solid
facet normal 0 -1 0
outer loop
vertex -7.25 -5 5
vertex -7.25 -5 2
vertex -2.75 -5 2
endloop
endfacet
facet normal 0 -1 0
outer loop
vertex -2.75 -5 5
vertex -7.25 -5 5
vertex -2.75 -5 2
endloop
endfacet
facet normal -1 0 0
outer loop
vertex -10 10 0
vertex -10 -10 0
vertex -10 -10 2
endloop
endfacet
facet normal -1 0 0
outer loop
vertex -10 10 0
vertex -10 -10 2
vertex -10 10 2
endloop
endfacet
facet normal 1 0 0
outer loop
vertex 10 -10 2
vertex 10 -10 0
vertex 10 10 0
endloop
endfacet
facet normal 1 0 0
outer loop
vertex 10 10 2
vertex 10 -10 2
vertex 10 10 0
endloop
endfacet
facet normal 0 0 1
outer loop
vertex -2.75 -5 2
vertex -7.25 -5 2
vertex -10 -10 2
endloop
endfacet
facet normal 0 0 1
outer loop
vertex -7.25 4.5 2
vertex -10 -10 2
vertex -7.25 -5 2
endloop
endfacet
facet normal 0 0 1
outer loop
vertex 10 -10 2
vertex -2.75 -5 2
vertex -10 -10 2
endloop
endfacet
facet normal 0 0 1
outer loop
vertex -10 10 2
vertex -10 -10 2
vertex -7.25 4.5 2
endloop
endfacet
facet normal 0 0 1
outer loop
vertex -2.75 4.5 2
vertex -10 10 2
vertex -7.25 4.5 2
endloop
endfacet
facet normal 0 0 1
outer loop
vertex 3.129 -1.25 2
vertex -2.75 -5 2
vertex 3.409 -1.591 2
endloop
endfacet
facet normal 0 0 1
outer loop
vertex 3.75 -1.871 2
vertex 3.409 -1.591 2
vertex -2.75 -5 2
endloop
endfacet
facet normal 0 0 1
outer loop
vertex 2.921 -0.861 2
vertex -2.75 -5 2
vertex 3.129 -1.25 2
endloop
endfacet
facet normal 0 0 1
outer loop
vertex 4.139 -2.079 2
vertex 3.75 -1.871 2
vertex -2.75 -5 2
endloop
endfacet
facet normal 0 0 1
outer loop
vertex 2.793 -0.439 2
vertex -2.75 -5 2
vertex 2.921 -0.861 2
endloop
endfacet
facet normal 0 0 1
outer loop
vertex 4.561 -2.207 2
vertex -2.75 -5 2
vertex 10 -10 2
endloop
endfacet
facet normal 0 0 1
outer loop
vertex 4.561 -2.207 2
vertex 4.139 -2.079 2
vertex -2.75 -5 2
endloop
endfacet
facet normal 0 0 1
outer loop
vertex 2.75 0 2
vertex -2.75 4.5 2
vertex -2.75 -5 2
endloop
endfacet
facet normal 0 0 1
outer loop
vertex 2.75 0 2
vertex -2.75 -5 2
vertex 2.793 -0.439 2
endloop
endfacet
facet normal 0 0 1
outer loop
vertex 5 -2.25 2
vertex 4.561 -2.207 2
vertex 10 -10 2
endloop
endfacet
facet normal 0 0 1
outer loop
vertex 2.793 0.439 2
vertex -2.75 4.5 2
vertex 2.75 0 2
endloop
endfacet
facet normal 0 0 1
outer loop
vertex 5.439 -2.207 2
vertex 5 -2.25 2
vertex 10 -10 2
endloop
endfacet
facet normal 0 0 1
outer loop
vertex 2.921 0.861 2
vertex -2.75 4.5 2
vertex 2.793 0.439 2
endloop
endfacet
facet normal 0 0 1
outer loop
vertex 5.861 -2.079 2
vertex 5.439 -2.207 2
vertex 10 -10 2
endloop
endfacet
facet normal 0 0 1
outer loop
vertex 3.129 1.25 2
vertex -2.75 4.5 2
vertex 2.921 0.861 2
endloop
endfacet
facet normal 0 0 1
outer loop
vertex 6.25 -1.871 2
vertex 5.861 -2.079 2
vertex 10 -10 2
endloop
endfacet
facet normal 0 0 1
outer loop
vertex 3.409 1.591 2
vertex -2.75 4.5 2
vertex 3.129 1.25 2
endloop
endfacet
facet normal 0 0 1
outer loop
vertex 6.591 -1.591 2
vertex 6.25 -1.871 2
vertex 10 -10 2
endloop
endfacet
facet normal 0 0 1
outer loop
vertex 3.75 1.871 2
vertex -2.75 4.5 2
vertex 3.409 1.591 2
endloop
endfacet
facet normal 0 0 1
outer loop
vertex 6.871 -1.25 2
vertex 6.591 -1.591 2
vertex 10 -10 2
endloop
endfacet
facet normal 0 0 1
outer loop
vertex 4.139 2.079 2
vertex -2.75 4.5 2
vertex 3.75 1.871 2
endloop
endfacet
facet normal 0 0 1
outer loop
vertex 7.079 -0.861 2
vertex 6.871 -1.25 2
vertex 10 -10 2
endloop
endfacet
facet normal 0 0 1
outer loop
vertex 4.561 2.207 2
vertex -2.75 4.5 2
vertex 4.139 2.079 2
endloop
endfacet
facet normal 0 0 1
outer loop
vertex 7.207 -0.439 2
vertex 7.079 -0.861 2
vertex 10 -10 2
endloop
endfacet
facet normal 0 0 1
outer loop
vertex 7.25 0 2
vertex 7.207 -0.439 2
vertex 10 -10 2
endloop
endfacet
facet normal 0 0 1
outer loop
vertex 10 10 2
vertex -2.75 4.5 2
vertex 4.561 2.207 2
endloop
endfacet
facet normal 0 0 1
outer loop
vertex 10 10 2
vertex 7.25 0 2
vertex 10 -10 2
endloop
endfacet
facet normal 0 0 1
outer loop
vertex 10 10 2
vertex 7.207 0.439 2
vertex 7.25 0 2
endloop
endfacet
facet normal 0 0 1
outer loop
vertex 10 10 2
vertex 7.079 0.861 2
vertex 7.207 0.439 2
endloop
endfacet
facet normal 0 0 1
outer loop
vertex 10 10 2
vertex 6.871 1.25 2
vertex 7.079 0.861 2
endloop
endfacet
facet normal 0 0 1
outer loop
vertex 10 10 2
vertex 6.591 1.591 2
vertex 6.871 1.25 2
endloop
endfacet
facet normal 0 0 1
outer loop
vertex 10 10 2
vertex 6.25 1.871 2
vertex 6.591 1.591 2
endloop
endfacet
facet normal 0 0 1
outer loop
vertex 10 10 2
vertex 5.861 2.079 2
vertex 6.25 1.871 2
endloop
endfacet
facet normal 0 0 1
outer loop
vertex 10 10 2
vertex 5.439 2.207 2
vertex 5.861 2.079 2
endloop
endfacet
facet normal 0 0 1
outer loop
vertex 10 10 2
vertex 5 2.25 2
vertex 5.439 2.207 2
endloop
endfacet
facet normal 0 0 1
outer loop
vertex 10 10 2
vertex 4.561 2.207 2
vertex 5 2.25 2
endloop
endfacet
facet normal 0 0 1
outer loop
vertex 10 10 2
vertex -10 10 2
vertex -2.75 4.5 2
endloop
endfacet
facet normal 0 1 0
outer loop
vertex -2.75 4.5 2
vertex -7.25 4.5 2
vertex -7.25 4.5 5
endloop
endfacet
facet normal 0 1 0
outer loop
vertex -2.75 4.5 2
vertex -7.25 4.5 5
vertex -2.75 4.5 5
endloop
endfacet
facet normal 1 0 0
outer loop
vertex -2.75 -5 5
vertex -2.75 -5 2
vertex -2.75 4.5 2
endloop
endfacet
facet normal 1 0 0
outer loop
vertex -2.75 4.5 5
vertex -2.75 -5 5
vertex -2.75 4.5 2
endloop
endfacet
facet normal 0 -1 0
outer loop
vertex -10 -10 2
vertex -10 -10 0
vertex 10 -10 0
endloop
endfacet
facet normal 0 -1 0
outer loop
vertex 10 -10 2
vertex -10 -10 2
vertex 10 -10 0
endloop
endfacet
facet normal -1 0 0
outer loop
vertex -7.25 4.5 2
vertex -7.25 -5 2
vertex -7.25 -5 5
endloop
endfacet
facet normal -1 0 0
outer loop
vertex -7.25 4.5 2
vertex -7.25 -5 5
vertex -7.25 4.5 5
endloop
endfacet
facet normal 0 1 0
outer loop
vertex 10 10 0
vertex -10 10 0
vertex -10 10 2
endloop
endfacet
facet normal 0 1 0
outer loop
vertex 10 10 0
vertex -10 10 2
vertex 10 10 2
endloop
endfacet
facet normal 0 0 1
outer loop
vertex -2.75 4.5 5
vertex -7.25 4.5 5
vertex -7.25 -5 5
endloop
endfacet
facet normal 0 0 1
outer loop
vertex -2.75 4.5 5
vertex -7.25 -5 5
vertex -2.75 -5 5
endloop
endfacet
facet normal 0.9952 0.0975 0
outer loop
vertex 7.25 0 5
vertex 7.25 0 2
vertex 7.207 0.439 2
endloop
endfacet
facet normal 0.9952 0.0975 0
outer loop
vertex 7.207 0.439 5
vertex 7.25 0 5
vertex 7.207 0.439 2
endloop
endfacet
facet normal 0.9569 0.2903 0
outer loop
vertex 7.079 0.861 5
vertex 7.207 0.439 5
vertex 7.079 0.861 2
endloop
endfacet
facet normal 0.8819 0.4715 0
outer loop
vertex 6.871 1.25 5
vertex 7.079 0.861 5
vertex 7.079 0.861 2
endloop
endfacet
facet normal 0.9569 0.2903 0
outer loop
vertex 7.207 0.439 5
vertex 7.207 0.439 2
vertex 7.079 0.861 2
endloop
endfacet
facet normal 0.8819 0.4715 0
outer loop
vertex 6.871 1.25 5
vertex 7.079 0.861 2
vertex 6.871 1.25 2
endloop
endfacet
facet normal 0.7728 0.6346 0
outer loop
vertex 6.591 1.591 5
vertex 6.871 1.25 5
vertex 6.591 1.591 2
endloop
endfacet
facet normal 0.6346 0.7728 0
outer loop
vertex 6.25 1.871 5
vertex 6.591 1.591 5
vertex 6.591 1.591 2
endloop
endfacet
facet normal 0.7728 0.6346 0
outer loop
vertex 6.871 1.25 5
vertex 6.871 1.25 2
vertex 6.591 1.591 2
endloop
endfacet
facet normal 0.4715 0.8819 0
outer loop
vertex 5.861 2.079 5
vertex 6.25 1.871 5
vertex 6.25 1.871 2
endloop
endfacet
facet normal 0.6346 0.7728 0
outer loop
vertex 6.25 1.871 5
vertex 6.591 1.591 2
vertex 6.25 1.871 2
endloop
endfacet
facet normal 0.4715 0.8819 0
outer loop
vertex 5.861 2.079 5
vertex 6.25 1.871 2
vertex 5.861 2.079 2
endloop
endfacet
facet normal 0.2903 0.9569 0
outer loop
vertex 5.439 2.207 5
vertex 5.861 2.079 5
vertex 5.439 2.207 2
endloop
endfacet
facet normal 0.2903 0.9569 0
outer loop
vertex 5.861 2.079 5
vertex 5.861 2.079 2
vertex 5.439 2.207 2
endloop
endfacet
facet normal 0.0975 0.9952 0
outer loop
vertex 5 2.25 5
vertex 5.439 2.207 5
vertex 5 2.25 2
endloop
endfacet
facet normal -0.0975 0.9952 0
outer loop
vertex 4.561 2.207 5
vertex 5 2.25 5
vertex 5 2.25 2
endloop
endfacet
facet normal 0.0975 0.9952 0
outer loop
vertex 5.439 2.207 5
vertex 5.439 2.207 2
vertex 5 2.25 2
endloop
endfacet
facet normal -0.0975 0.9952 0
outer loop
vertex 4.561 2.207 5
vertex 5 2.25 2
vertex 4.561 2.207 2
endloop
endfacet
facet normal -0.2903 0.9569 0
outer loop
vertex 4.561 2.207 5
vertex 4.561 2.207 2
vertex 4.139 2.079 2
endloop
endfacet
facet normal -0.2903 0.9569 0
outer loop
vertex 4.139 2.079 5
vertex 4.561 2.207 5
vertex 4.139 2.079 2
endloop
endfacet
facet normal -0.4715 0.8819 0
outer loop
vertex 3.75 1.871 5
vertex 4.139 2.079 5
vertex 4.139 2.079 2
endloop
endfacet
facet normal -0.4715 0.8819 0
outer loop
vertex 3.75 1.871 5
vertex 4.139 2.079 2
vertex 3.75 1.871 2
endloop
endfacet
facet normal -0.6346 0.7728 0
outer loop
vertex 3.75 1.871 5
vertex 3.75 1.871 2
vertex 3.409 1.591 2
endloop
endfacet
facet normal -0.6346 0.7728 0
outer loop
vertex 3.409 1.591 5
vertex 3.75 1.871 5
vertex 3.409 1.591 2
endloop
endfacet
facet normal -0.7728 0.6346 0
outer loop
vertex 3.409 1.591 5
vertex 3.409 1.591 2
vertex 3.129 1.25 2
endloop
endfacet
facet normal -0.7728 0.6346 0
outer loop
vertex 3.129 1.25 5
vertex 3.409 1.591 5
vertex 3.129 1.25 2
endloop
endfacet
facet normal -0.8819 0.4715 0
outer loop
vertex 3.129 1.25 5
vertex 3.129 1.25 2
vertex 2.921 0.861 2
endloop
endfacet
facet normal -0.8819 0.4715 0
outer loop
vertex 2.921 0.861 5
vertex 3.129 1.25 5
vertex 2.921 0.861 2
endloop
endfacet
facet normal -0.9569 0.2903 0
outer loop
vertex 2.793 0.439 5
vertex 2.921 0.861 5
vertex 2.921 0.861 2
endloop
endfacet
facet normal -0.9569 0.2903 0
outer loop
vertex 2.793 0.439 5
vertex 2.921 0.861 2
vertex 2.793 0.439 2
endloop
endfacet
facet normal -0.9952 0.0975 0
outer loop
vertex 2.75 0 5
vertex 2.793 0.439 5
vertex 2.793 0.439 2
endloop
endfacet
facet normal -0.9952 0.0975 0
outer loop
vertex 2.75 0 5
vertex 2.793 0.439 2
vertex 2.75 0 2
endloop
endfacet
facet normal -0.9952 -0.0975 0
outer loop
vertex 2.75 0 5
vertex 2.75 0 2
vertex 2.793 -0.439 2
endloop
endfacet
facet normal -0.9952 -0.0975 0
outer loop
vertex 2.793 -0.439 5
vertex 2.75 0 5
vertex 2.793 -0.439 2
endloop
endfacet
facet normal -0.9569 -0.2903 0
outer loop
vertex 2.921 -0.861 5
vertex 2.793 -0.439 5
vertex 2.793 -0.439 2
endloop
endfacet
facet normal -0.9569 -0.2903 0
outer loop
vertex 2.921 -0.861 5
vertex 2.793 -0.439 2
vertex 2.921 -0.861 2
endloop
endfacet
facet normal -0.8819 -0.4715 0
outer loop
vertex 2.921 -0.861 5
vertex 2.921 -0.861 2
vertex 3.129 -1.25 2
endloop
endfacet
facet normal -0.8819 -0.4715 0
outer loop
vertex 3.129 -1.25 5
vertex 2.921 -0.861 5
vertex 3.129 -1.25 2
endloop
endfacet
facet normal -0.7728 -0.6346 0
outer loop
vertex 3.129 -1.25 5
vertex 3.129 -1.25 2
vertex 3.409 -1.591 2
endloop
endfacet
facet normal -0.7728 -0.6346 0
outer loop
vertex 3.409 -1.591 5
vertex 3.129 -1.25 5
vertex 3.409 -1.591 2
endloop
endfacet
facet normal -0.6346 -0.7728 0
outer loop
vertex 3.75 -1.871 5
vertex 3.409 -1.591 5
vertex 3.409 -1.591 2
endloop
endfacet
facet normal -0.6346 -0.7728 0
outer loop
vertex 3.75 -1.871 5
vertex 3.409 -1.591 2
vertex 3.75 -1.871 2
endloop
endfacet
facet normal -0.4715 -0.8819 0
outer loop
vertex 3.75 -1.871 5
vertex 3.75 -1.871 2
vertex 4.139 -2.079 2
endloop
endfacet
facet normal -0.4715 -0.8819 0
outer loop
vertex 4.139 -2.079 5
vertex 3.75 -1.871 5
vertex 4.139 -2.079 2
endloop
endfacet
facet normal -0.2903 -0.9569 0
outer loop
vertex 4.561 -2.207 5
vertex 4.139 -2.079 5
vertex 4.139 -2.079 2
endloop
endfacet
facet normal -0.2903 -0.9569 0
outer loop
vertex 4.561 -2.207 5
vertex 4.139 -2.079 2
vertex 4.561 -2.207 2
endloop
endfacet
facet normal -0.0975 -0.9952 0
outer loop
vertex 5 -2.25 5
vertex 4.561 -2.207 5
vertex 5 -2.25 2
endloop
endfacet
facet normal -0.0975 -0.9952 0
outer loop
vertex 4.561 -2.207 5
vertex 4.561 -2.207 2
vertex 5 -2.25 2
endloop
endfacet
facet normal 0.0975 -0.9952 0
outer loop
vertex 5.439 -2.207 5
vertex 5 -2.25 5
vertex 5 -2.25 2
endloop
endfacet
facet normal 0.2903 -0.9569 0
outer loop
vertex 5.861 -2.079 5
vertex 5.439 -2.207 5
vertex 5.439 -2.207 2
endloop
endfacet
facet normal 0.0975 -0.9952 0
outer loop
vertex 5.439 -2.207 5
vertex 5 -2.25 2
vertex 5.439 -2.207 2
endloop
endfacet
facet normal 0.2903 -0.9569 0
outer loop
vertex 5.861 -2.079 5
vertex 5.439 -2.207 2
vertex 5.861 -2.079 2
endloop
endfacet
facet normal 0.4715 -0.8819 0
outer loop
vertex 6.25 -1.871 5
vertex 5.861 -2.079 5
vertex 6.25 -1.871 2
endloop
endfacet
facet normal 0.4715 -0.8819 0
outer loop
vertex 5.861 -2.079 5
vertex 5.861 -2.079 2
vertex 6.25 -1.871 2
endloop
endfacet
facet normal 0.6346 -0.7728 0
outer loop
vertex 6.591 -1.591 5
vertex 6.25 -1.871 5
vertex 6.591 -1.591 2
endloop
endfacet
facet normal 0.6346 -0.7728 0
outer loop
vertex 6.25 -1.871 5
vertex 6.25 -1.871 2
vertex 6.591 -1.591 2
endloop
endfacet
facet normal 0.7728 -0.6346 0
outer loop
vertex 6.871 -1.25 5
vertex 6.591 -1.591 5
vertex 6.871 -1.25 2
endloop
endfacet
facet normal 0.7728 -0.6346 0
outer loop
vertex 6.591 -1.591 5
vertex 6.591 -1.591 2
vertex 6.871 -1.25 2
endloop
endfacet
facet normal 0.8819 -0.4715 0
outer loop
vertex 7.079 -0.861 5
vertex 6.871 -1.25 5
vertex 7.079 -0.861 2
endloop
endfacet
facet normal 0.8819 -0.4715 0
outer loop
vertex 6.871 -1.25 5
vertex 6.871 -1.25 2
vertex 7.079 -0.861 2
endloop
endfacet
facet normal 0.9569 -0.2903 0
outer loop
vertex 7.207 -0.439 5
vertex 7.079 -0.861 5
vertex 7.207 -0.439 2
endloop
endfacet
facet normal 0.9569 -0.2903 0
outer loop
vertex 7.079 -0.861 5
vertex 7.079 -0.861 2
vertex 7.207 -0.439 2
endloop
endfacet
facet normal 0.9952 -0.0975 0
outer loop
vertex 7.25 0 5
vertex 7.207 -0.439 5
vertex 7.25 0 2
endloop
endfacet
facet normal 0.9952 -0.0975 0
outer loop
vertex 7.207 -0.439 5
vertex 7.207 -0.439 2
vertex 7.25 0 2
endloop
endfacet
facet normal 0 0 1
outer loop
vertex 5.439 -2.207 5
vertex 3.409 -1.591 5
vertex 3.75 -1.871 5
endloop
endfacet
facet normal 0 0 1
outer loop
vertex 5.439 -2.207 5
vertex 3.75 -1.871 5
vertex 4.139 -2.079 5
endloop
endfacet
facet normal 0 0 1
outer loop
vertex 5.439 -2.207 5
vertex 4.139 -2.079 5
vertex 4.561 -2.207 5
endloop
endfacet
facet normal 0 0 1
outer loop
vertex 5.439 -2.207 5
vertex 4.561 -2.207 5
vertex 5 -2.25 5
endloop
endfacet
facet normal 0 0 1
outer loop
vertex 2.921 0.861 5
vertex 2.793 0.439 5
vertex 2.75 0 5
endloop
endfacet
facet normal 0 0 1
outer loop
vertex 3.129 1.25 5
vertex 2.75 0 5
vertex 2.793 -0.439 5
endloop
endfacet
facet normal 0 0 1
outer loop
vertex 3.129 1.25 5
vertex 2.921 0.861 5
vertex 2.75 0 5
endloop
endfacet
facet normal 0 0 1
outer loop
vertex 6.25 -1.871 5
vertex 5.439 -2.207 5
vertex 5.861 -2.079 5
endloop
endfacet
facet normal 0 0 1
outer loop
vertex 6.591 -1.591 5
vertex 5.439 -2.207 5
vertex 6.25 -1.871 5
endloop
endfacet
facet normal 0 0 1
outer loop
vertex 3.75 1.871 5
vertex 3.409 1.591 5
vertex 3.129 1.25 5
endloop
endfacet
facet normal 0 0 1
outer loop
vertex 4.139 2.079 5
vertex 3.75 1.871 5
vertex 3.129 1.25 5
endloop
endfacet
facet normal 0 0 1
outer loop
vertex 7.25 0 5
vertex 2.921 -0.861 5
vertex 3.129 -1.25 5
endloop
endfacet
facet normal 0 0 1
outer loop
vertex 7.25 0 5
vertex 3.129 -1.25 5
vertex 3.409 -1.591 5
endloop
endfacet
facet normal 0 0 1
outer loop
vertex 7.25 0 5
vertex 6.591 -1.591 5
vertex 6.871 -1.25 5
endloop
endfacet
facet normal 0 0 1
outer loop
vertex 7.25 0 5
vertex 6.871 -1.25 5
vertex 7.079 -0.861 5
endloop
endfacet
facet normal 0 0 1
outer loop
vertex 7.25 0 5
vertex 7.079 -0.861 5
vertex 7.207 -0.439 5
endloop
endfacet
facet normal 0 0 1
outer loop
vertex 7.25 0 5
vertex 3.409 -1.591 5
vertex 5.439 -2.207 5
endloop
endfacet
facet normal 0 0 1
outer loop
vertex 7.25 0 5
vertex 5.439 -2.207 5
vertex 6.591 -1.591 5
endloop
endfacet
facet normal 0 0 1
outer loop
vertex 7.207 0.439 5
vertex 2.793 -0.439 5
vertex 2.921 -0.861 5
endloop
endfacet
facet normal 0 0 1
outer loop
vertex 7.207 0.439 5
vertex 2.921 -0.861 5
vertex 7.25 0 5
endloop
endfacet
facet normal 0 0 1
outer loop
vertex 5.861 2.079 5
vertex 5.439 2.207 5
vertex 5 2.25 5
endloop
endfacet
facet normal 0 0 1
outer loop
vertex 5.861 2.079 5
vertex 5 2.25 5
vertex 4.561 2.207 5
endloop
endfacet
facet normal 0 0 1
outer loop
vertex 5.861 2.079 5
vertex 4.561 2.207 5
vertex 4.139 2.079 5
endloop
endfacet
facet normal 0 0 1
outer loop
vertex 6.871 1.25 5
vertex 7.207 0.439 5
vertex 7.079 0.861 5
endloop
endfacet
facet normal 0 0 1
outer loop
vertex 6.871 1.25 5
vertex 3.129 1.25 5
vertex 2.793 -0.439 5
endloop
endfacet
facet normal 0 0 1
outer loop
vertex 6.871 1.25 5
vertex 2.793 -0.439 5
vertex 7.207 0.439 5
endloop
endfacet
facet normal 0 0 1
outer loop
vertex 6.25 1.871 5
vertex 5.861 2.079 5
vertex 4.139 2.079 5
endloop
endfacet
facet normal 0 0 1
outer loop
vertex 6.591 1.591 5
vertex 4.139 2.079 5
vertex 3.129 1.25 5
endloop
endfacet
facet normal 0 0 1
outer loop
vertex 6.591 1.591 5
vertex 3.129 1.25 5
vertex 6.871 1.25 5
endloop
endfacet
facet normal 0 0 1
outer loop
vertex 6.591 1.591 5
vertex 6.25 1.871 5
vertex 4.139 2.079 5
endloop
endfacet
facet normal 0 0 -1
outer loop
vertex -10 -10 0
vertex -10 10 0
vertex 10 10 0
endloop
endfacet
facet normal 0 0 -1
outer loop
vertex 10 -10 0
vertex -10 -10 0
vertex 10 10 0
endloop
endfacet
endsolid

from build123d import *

# Parameters (mm, degrees)
F0_W     = 20
F0_H     = 20
F0_W_2   = 4.5
F0_H_2   = 9.5
F0_R     = 2.25
F1_DEPTH = 2
F2_DEPTH = 5


with BuildPart() as f1:
    # F0 (on Top) → F1 (new body)
    with BuildSketch(Plane.XY):
        Rectangle(F0_W, F0_H)
        with Locations((-5, -0.25)):
            Rectangle(F0_W_2, F0_H_2, mode=Mode.SUBTRACT)
        with Locations((5, 0)):
            Circle(F0_R, mode=Mode.SUBTRACT)
    extrude(amount=F1_DEPTH)

    # F0 (on Top) → F2 (join)
    with BuildSketch(Plane.XY):
        with Locations((-5, -0.25)):
            Rectangle(F0_W_2, F0_H_2)
        with Locations((5, 0)):
            Circle(F0_R)
    extrude(amount=F2_DEPTH)


solid = f1.part
